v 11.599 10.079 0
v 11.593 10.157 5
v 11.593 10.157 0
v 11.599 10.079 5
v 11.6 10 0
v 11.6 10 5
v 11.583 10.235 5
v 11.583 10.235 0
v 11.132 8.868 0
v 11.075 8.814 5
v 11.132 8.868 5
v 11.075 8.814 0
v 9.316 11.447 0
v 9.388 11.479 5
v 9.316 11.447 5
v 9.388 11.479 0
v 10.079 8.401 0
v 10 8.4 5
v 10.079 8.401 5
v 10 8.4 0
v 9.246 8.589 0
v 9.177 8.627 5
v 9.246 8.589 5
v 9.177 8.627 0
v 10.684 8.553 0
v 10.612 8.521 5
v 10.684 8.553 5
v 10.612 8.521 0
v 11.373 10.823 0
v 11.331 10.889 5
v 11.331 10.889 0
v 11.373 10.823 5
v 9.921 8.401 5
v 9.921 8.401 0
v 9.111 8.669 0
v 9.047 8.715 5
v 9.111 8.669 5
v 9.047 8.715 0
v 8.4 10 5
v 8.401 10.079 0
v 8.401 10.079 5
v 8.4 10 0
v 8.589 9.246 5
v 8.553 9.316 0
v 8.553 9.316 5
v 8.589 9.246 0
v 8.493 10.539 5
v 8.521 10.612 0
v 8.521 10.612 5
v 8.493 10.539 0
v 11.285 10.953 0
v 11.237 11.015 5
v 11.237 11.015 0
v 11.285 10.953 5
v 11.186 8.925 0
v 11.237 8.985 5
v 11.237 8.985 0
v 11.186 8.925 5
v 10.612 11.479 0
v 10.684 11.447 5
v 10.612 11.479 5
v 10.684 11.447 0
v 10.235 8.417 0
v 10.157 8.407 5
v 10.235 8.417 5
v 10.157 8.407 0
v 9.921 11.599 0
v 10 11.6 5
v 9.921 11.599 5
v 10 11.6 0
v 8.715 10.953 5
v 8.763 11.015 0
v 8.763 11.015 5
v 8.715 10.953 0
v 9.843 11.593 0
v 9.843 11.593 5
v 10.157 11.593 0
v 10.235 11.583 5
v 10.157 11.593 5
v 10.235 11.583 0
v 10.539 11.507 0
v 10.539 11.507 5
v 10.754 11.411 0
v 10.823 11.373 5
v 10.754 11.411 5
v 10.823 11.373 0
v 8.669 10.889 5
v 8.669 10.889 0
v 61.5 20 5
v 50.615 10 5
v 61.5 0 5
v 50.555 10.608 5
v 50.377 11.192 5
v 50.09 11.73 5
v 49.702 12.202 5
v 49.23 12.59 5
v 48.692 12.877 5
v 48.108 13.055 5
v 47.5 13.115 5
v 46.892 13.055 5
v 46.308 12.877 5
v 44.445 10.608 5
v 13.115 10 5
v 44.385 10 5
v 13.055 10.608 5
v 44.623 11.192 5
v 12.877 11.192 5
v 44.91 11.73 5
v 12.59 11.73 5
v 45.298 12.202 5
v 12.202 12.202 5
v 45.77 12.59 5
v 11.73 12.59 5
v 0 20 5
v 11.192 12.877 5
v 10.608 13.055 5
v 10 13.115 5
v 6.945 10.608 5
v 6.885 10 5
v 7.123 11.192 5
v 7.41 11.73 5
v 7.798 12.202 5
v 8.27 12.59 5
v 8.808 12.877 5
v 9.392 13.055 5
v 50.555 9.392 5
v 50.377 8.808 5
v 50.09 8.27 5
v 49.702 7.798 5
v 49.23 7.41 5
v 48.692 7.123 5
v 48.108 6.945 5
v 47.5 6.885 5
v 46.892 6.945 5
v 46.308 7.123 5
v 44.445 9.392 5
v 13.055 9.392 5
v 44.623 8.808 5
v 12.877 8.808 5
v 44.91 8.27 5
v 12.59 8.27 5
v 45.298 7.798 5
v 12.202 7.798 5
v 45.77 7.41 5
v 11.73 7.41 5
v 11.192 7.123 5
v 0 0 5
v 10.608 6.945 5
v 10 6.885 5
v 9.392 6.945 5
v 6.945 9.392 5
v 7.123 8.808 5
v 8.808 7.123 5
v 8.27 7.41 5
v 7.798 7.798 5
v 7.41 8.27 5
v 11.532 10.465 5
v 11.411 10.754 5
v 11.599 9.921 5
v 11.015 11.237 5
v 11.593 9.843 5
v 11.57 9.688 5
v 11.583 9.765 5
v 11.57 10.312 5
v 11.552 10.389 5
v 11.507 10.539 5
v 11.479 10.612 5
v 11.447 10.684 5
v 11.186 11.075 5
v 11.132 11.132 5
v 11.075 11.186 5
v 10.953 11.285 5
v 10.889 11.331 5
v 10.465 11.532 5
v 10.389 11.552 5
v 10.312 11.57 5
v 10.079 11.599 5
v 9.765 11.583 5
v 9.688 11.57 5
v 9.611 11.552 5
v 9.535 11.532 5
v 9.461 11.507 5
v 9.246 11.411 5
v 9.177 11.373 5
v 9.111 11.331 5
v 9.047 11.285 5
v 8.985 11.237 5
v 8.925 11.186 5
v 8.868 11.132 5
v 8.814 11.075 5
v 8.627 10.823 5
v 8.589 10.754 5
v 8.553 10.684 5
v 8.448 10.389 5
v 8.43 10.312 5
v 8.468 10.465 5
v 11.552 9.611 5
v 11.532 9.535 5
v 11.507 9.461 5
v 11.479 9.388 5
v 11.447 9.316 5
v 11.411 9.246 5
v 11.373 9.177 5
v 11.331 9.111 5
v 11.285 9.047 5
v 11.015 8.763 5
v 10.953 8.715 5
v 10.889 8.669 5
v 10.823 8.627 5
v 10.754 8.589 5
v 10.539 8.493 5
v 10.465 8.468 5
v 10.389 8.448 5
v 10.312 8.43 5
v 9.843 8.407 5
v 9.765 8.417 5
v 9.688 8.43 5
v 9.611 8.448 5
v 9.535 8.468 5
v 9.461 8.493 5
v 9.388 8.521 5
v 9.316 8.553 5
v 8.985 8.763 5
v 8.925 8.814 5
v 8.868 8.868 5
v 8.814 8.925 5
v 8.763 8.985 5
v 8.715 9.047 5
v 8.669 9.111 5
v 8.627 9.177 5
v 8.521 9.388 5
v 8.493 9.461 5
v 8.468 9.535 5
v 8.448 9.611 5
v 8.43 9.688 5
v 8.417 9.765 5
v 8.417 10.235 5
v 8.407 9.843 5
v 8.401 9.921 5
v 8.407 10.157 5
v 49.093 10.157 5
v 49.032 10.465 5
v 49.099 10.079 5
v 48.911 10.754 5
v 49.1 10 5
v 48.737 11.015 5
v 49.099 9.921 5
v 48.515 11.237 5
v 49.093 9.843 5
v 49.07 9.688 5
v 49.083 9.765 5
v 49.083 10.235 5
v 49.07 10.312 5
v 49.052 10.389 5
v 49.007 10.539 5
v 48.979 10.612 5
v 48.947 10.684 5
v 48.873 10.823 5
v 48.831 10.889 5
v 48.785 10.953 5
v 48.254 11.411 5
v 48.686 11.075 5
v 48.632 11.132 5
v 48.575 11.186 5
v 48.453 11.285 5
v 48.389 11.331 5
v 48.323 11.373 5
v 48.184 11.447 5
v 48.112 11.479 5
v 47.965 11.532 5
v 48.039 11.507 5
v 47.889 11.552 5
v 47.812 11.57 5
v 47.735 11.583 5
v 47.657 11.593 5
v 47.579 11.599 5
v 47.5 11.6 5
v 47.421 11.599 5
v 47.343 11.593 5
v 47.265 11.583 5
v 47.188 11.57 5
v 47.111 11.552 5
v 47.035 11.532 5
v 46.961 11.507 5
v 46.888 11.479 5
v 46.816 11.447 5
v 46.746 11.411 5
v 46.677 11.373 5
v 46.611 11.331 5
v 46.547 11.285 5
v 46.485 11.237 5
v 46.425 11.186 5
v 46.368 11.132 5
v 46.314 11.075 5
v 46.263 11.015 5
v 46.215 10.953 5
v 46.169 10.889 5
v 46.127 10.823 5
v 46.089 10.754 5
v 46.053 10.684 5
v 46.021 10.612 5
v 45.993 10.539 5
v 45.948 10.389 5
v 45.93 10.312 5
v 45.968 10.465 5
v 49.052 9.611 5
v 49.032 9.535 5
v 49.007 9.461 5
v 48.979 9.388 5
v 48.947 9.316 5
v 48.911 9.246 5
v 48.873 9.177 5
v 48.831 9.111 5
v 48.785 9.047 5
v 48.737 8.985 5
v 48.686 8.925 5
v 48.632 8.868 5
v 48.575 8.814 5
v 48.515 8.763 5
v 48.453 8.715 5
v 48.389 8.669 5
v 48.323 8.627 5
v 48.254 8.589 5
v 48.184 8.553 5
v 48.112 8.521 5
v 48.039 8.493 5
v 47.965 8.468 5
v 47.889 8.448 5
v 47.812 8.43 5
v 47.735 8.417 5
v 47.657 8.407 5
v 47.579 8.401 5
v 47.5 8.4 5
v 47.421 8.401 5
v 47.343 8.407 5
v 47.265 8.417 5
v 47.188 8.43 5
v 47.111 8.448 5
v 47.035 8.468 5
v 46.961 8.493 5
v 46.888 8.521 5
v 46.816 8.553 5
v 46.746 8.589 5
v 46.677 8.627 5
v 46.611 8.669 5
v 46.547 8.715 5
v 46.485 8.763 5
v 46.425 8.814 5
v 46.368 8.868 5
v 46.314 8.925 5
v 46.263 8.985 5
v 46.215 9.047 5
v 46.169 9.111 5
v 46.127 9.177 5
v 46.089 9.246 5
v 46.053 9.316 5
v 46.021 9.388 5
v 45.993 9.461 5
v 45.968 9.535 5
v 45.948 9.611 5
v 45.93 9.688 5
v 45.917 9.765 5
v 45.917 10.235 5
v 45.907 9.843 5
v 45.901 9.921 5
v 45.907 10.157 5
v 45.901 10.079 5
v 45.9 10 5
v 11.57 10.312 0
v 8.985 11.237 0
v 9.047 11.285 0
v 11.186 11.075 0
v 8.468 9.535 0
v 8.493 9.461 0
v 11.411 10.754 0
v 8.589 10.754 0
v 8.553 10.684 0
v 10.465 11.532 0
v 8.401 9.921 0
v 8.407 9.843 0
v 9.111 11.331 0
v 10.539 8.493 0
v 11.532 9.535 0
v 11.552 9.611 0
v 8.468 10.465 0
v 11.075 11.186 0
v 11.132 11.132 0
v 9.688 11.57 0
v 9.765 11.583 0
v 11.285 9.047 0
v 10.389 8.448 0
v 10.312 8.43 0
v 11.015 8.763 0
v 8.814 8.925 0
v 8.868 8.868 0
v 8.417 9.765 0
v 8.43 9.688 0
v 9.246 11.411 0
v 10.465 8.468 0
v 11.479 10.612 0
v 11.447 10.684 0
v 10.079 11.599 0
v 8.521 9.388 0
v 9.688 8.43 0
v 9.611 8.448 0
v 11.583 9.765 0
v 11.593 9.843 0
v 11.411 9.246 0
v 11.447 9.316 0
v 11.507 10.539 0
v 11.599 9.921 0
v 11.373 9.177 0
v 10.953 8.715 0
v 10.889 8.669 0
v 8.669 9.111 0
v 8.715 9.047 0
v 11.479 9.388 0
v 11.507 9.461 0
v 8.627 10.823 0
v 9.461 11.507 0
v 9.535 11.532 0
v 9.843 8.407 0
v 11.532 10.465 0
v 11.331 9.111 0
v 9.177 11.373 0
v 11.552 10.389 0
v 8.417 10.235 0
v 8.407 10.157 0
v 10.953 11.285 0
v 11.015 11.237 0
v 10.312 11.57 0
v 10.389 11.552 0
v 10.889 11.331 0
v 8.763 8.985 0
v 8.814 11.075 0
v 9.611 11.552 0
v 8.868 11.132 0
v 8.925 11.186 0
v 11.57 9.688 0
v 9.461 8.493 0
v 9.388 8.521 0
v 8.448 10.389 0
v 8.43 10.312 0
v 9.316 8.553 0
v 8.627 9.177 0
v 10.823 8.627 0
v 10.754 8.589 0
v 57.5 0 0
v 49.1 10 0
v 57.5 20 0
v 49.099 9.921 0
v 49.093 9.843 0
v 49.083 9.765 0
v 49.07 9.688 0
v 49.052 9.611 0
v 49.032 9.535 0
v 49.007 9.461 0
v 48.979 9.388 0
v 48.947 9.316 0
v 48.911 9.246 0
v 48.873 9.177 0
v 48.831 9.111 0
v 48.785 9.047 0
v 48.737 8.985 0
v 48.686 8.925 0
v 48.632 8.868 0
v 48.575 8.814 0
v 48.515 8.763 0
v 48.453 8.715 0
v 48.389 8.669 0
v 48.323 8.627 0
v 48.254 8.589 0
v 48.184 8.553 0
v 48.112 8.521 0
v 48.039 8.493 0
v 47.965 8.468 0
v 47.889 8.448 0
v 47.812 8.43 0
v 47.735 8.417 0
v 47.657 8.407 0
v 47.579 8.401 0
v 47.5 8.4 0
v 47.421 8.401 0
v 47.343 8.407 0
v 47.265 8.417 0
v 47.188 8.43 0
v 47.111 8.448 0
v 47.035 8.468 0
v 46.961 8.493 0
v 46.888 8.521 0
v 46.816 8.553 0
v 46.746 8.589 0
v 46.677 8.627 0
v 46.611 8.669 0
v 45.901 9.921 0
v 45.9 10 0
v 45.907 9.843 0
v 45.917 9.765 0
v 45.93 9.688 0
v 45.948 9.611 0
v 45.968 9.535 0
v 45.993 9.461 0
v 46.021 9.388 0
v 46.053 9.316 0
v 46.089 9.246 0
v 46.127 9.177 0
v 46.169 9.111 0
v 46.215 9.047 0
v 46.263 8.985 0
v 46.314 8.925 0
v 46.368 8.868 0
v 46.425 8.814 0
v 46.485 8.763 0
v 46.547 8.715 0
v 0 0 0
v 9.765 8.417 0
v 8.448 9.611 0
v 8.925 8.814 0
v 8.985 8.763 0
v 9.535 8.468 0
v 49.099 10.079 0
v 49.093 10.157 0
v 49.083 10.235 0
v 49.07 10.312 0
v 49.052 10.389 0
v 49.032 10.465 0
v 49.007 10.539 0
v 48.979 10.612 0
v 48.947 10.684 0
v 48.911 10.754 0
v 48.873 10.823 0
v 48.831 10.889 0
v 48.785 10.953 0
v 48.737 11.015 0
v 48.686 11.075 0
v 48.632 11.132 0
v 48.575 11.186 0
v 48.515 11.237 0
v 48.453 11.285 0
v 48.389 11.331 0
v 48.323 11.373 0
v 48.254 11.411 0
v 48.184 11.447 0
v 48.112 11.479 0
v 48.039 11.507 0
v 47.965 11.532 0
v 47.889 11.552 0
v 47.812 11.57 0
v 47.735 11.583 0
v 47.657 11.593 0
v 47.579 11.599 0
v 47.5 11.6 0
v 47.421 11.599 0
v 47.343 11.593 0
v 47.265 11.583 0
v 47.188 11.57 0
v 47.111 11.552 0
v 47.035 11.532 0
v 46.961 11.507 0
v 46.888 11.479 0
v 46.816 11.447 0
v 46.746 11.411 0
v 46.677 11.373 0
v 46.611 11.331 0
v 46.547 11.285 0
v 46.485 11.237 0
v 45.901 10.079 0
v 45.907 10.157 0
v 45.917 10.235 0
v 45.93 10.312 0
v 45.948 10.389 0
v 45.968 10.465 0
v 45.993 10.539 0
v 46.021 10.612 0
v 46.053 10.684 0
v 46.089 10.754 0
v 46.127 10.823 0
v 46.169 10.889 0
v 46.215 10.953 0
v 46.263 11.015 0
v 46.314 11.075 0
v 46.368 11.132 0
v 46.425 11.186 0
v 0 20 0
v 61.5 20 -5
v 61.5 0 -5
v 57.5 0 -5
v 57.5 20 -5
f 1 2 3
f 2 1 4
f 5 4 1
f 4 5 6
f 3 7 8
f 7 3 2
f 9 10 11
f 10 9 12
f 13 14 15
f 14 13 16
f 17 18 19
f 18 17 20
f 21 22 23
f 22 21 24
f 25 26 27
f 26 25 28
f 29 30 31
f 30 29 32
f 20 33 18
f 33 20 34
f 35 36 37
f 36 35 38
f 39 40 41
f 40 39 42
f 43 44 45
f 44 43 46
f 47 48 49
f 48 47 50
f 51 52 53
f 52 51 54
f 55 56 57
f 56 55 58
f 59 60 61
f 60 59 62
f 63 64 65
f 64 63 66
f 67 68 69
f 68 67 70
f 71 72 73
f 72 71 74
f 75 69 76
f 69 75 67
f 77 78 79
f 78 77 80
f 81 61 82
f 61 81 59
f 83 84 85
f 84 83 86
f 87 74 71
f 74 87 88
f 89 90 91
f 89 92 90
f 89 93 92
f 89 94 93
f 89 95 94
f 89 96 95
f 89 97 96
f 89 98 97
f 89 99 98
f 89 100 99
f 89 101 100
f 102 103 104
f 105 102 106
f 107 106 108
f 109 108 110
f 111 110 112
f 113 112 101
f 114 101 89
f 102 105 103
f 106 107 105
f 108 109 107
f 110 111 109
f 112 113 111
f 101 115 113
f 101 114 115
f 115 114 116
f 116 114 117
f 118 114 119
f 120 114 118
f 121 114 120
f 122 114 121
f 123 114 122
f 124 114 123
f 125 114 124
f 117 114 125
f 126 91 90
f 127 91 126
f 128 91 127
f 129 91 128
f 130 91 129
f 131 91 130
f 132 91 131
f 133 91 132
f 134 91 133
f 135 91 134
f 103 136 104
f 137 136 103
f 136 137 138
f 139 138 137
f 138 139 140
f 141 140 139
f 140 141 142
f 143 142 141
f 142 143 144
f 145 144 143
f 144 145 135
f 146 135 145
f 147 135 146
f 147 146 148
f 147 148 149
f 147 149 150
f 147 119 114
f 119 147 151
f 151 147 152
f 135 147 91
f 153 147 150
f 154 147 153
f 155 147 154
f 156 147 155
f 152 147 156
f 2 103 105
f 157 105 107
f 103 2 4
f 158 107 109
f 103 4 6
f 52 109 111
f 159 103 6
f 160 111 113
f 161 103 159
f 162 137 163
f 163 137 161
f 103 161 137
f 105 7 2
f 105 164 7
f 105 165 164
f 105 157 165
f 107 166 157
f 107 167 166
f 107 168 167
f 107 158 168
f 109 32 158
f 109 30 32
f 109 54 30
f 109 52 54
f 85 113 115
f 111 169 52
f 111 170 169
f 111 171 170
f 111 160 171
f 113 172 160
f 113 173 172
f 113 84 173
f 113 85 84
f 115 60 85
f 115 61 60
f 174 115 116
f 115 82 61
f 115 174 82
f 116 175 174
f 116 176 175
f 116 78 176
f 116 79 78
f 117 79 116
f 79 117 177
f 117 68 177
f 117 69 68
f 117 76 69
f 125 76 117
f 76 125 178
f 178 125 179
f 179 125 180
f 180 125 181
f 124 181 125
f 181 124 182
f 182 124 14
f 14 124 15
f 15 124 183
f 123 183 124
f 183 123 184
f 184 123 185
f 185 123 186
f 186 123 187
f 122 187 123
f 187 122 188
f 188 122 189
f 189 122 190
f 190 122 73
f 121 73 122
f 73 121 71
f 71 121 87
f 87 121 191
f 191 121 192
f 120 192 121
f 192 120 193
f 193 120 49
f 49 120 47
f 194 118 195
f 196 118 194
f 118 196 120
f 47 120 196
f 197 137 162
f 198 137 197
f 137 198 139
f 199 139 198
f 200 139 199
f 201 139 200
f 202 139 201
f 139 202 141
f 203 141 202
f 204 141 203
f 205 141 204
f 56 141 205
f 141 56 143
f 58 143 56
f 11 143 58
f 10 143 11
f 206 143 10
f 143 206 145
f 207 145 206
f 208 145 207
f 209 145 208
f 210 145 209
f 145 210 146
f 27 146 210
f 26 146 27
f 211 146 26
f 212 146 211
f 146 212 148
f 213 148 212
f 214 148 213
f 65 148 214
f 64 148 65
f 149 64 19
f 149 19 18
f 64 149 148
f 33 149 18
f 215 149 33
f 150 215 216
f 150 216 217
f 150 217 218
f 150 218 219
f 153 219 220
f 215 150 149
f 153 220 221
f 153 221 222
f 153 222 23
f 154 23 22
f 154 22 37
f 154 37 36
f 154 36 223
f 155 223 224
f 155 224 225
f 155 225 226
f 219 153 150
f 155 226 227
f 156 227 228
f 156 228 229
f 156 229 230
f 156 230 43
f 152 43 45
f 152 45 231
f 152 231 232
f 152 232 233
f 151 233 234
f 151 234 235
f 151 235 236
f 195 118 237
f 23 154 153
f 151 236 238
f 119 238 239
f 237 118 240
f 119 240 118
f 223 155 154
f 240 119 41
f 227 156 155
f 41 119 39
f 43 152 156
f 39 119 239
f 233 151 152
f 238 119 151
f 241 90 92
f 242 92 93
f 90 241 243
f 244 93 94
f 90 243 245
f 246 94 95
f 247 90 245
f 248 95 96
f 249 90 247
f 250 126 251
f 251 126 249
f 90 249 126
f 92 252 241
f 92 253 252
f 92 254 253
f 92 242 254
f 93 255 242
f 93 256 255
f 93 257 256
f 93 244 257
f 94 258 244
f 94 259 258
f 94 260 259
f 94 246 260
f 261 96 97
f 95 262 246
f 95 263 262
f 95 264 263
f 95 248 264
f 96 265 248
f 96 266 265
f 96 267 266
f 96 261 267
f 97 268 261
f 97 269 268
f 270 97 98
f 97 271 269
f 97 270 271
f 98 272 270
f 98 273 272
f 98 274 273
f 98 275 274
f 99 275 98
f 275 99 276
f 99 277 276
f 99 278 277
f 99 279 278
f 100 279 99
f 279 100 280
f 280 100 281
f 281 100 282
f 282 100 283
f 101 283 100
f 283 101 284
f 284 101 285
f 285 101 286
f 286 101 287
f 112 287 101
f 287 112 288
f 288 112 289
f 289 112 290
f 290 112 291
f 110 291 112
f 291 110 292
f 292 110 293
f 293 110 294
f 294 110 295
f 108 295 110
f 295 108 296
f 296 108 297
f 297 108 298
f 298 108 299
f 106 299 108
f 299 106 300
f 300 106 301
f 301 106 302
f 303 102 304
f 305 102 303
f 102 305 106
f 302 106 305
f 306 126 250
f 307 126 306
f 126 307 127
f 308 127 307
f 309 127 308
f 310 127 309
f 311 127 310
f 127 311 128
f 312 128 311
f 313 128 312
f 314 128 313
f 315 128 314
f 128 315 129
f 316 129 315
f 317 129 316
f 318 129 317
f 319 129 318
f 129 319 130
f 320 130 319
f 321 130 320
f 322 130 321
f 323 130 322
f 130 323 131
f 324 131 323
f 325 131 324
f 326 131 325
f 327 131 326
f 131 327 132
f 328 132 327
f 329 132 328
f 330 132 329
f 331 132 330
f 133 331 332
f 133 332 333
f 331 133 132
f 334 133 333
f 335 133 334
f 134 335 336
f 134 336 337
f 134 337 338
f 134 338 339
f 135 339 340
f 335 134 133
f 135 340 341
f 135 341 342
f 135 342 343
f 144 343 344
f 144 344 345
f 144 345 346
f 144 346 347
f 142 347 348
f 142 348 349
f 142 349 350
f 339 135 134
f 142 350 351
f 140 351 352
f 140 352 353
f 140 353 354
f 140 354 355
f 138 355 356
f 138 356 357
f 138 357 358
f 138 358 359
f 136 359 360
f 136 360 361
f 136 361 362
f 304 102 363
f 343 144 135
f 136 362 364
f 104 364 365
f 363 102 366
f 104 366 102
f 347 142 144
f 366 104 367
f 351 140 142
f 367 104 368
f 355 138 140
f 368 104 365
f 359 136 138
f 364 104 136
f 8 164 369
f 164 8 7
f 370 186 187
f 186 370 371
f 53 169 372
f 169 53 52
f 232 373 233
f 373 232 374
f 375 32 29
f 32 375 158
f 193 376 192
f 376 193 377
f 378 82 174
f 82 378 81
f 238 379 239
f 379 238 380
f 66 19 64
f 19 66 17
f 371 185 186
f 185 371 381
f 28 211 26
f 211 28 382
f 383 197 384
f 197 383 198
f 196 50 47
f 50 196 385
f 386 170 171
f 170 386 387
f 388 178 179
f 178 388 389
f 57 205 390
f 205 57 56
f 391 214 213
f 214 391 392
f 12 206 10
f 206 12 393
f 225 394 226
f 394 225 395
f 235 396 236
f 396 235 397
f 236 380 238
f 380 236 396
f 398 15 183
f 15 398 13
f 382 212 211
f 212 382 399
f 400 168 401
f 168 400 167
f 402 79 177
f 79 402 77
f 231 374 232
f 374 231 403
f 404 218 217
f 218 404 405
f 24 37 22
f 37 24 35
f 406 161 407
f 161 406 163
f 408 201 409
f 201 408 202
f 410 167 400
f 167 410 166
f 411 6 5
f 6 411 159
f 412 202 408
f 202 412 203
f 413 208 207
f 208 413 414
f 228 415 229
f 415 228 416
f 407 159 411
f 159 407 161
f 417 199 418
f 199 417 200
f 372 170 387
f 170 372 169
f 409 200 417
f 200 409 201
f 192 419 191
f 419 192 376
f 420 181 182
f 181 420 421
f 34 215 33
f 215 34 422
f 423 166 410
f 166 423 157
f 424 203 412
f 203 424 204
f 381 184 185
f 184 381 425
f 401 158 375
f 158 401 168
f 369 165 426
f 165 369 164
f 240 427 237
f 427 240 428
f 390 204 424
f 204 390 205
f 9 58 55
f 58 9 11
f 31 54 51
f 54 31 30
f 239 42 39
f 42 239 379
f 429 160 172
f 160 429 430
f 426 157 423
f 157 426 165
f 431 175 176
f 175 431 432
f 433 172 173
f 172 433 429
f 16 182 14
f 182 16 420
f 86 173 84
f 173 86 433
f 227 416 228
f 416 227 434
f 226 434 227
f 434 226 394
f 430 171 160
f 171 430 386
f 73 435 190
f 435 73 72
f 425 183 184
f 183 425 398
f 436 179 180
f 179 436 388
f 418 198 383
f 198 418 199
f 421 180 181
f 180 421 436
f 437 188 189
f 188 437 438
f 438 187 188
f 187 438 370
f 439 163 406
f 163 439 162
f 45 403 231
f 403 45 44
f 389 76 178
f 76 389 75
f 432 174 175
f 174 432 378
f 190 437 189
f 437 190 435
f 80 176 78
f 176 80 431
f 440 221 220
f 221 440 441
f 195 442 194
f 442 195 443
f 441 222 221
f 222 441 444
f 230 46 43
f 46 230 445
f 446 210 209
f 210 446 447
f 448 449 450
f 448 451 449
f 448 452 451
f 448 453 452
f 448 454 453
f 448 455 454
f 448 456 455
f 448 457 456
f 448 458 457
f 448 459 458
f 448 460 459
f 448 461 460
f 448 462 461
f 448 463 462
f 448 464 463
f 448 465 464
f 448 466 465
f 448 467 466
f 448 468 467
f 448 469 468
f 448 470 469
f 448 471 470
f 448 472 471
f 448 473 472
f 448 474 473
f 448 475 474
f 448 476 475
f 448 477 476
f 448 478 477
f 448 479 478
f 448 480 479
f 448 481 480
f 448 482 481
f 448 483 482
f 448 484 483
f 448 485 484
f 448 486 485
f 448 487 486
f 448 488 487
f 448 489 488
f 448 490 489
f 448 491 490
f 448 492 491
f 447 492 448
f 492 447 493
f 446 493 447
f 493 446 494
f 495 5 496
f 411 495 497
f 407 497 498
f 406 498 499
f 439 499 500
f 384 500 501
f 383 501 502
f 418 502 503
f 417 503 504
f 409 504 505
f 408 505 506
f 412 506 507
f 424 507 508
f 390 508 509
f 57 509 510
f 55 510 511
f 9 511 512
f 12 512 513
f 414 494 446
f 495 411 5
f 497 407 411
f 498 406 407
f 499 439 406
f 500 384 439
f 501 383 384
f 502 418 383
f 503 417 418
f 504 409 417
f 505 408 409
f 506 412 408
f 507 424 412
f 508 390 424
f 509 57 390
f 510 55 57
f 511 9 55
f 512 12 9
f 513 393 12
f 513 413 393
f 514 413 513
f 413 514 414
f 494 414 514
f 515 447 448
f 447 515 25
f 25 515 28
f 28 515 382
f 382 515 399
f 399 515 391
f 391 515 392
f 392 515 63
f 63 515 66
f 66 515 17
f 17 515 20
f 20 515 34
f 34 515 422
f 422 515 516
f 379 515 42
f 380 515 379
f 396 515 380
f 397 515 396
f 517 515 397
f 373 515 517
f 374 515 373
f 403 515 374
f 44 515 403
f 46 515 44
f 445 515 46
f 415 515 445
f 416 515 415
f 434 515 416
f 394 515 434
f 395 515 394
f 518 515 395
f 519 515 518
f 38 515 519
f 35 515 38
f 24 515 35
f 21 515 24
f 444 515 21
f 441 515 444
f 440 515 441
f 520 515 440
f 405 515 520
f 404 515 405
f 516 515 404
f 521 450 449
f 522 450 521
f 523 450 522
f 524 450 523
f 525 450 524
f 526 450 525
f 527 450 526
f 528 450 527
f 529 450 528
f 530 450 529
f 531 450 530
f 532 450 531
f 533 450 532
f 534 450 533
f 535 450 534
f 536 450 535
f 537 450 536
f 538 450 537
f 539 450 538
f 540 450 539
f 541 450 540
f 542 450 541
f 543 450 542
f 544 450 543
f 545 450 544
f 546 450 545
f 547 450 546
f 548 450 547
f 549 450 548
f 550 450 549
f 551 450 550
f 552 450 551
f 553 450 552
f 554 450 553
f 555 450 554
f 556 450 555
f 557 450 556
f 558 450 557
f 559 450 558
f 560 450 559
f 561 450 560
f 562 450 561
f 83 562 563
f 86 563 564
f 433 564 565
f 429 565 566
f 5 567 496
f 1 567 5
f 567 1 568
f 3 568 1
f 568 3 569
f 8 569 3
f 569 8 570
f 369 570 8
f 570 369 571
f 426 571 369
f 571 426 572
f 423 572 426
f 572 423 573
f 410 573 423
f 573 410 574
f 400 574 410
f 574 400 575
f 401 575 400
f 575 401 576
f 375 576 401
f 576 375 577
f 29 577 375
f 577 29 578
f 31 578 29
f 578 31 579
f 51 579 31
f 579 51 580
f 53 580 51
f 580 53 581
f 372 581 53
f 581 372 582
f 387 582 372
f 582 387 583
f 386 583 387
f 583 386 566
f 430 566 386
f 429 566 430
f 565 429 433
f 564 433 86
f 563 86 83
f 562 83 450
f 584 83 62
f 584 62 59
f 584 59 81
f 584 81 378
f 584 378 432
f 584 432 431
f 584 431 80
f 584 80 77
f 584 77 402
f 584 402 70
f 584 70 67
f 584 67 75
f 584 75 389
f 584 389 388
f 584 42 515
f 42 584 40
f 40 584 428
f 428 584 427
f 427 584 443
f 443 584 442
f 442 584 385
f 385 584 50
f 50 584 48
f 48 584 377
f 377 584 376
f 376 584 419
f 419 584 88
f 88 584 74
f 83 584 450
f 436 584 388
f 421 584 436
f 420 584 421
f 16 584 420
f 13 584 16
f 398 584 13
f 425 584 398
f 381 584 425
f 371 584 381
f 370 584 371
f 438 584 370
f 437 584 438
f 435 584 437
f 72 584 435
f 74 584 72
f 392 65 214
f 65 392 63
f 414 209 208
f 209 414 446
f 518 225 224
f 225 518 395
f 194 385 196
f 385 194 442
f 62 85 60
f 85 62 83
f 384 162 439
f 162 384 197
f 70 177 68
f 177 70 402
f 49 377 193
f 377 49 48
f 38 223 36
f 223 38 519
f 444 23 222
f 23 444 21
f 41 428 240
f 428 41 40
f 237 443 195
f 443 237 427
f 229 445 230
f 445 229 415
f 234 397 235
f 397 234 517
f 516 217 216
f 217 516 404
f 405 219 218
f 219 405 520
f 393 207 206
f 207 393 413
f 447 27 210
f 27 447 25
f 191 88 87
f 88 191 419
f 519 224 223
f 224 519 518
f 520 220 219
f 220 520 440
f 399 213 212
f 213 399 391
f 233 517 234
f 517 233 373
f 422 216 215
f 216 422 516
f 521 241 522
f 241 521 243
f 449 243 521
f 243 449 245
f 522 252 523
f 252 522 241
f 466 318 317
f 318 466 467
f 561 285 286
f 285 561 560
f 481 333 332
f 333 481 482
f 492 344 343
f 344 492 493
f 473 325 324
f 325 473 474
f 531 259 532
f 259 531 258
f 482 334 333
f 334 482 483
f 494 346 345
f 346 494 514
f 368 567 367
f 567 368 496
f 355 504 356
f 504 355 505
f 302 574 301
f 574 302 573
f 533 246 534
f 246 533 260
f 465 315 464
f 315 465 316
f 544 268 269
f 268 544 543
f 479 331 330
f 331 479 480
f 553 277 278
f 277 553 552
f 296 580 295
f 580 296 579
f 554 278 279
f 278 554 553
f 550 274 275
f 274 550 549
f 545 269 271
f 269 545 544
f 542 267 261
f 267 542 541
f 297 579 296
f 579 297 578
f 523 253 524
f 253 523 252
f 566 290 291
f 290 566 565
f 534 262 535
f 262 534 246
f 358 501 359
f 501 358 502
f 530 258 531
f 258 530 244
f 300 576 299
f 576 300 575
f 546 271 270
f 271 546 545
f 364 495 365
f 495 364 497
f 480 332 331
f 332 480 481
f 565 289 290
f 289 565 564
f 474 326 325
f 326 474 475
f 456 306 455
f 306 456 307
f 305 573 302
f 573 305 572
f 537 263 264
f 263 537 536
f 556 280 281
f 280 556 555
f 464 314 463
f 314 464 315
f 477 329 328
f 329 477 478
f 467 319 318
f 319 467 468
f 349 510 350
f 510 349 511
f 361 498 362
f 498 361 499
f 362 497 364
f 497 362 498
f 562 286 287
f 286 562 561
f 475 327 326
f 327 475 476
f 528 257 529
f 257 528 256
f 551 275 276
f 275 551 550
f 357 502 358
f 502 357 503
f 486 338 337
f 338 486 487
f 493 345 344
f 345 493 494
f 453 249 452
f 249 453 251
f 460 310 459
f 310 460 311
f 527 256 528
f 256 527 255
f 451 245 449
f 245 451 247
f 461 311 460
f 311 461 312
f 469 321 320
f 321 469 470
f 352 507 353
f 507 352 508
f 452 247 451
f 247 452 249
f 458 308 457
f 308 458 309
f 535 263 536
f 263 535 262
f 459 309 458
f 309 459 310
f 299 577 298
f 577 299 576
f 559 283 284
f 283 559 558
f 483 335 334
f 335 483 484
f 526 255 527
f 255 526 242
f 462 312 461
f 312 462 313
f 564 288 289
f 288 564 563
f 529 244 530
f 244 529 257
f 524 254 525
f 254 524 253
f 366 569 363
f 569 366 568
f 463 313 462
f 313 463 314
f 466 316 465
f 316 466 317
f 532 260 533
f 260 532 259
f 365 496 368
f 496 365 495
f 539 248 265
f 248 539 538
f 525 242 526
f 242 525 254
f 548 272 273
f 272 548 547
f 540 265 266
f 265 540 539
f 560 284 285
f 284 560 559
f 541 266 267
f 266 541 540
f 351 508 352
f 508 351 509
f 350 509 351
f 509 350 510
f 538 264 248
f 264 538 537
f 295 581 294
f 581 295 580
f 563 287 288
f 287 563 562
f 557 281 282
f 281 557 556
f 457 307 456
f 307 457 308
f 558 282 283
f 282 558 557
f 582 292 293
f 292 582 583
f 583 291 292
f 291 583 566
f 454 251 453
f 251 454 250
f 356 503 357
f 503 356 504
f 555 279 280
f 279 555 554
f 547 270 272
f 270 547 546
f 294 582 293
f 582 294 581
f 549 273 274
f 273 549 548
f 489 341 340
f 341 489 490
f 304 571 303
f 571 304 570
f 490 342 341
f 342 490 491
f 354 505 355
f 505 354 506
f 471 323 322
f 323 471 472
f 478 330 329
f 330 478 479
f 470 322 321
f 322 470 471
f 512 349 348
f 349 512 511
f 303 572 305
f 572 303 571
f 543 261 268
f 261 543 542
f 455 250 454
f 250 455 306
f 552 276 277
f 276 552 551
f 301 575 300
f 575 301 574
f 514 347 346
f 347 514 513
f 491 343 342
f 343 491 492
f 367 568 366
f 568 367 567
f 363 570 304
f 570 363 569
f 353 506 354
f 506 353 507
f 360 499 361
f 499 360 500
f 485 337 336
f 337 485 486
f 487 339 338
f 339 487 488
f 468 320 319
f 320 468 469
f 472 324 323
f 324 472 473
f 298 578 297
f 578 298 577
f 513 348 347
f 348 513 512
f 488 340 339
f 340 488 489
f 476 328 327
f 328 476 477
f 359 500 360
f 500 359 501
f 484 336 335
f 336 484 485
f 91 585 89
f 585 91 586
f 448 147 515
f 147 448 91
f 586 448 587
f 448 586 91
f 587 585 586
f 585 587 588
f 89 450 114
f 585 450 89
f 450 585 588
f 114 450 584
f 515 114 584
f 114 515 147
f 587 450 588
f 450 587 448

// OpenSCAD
// file: bolts.scad
$radial_error = 0.1;

$fn = $preview ? 24 : 128;

ISO262_COARSE_PITCH = [
	[1.0, 0.25],
	[1.2, 0.25],
	[1.4, 0.2],
	[1.6, 0.35],
	[1.8, 0.2],
	[2.0, 0.4],
	[2.5, 0.45],
	[3.0, 0.5],
	[3.5, 0.35],
	[4.0, 0.7],
	[5.0, 0.8],
	[6.0, 1.0],
	[7.0, 0.75],
	[8.0, 1.25],
	[10.0, 1.5],
	[12.0, 1.75],
	[14.0, 1.5],
	[16.0, 2.0],
	[30.0, 3.5],
	[42.0, 4.5],
	[56.0, 5.5]
];

function coarse_pitch(d) = lookup(d, ISO262_COARSE_PITCH);
function pitch_height(d) = coarse_pitch(d) * 0.866025;

function fudge_factor(fn=$fn) = 1/cos(180/fn);
function outer_radius(radius, fn=$fn, radial_error=$radial_error) = radius*fudge_factor(fn)+radial_error;

module sphere_outer(radius, fn=$fn, radial_error=$radial_error) {
	sphere(r=radius*fudge_factor(fn)+radial_error, $fn=fn);
}

module cylinder_outer(height, radius, fn=$fn, radial_error=$radial_error) {
	cylinder(h=height,r=radius*fudge_factor(fn)+radial_error, $fn=fn);
}

module cylinder_inner(height, radius, fn=$fn, radial_error=$radial_error) {
	cylinder(h=height,r=radius-radial_error,$fn=fn);
}

// Make a hole. The diameter is the size of the screw (e.g. 3 for M3). Depth is how far the hole should go for the thread, and inset is how far out there should be a hole for the head to go.
module hole(diameter=3, depth=6, inset=10, height=0) {
	cylinder_outer(depth, (diameter-height)/2);
	
	if (inset) {
		translate([0, 0, depth]) cylinder_outer(inset, diameter, 32);
	}
}

module threaded_hole(diameter=3, depth=6, inset=10) {
	hole(diameter, depth, inset, pitch_height(diameter));
}

module screw_hole(diameter = 3, depth = 16, inset = 10, thickness = 6) {
	insert = depth - thickness;
	height = pitch_height(diameter);
	
	// The part that the screw will thread into:
	cylinder_outer(insert, (diameter-height)/2);
	
	translate([0, 0, insert])
	hole(diameter, depth - insert, inset);
}

module countersunk_screw_hole(diameter = 3, depth = 16, inset = 10, thickness = 6) {
	insert = depth - thickness;
	height = pitch_height(diameter);
	
	// The part that the screw will thread into:
	cylinder_outer(insert, (diameter-height)/2);
	
	translate([0, 0, insert])
	countersunk_hole(diameter, depth - insert, inset);
}

module countersunk_hole(diameter=3, depth=6, inset=10, pitch=0, radial_error=$radial_error) {
	hole(diameter, depth, inset, pitch);
	translate([0, 0, depth-diameter/2]) cylinder(r1=diameter/2+radial_error, r2=diameter+radial_error, h=diameter/2);
}

module knurled_insert(diameter = 3, depth = 6, thickness = 1) {
	cylinder_inner(depth, diameter/2 + thickness);
}

module knurled_hole(diameter = 3, depth = 6, inset = 10, insert = 4, thickness = 1) {
	hole(diameter, depth, inset);
	
	knurled_insert(diameter, insert, thickness);
}

module countersunk_knurled_hole(diameter = 3, depth = 6, inset = 10, insert = 4, thickness = 1) {
	countersunk_hole(diameter, depth, inset);
	
	knurled_insert(diameter, insert, thickness);
}

// Make a hole for a bolt/screw combination.
module bolted_hole(diameter=3, depth=8, nut_offset=2, shaft_length=10, inset=10) {
	hole(diameter, depth, inset);
	hull() {
		shaft_width = diameter;
		translate([0, 0, nut_offset]) rotate(360/12, [0, 0, 1]) cylinder_outer(diameter, shaft_width, 6);
		translate([0, shaft_length, nut_offset]) rotate(360/12, [0, 0, 1]) cylinder_outer(diameter, shaft_width, 6);
	}
}

module countersunk_bolted_hole(diameter=3, depth=8, nut_offset=2, shaft_length=10, inset=10) {
	countersunk_hole(diameter, depth, inset);
	hull() {
		shaft_width = diameter;
		translate([0, 0, nut_offset]) rotate(360/12, [0, 0, 1]) cylinder_outer(diameter, shaft_width, 6);
		translate([0, shaft_length, nut_offset]) rotate(360/12, [0, 0, 1]) cylinder_outer(diameter, shaft_width, 6);
	}
}

module mounting_hole(diameter=3, depth=6, inset=10, outset=3) {
	difference() {
		cylinder_outer(depth, diameter/2+outset);
		hole(diameter=diameter, depth=depth, inset=inset);
	}
}

!render() rotate(90, [1, 0, 0]) difference() {
	cube([40, 10, 10]);
	translate([5, 5, 0]) screw_hole();
}

render() rotate(90, [1, 0, 0]) difference() {
	cube([40, 10, 10]);
	translate([5, 5, 0]) bolted_hole(diameter=3, depth=8);
	translate([15, 5, 0]) bolted_hole(diameter=4, depth=8);
	translate([25, 5, 0]) countersunk_hole(diameter=4, depth=8);
	translate([35, 5, 0]) knurled_hole();
}

render() rotate(90, [1, 0, 0]) difference() {
	cube([6*4, 12, 12]);
	translate([6, 6, 0]) hole(diameter=5, depth=8);
	translate([6*3, 6, 0]) hole(diameter=5.5, depth=8);
}
// main file
use <bolts.scad>;

size = 190/4+10;
echo("size", size);

render()
difference() {
	translate([0, 0, -5])
	hull() {
		cube([24,20,10]);
		
		translate([size - 20, 0, 0])
		cube([24,20,10]);
	}
	
	translate([0, 0, -5])
	hull() {
		cube([20,20,5]);
		
		translate([size - 20, 0, 0])
		cube([20,20,5]);
	}
	
	translate([10, 10, 0])
	hole(3, 5);
	
	translate([10 + size - 20, 10, 0])
	hole(3, 5);
}
